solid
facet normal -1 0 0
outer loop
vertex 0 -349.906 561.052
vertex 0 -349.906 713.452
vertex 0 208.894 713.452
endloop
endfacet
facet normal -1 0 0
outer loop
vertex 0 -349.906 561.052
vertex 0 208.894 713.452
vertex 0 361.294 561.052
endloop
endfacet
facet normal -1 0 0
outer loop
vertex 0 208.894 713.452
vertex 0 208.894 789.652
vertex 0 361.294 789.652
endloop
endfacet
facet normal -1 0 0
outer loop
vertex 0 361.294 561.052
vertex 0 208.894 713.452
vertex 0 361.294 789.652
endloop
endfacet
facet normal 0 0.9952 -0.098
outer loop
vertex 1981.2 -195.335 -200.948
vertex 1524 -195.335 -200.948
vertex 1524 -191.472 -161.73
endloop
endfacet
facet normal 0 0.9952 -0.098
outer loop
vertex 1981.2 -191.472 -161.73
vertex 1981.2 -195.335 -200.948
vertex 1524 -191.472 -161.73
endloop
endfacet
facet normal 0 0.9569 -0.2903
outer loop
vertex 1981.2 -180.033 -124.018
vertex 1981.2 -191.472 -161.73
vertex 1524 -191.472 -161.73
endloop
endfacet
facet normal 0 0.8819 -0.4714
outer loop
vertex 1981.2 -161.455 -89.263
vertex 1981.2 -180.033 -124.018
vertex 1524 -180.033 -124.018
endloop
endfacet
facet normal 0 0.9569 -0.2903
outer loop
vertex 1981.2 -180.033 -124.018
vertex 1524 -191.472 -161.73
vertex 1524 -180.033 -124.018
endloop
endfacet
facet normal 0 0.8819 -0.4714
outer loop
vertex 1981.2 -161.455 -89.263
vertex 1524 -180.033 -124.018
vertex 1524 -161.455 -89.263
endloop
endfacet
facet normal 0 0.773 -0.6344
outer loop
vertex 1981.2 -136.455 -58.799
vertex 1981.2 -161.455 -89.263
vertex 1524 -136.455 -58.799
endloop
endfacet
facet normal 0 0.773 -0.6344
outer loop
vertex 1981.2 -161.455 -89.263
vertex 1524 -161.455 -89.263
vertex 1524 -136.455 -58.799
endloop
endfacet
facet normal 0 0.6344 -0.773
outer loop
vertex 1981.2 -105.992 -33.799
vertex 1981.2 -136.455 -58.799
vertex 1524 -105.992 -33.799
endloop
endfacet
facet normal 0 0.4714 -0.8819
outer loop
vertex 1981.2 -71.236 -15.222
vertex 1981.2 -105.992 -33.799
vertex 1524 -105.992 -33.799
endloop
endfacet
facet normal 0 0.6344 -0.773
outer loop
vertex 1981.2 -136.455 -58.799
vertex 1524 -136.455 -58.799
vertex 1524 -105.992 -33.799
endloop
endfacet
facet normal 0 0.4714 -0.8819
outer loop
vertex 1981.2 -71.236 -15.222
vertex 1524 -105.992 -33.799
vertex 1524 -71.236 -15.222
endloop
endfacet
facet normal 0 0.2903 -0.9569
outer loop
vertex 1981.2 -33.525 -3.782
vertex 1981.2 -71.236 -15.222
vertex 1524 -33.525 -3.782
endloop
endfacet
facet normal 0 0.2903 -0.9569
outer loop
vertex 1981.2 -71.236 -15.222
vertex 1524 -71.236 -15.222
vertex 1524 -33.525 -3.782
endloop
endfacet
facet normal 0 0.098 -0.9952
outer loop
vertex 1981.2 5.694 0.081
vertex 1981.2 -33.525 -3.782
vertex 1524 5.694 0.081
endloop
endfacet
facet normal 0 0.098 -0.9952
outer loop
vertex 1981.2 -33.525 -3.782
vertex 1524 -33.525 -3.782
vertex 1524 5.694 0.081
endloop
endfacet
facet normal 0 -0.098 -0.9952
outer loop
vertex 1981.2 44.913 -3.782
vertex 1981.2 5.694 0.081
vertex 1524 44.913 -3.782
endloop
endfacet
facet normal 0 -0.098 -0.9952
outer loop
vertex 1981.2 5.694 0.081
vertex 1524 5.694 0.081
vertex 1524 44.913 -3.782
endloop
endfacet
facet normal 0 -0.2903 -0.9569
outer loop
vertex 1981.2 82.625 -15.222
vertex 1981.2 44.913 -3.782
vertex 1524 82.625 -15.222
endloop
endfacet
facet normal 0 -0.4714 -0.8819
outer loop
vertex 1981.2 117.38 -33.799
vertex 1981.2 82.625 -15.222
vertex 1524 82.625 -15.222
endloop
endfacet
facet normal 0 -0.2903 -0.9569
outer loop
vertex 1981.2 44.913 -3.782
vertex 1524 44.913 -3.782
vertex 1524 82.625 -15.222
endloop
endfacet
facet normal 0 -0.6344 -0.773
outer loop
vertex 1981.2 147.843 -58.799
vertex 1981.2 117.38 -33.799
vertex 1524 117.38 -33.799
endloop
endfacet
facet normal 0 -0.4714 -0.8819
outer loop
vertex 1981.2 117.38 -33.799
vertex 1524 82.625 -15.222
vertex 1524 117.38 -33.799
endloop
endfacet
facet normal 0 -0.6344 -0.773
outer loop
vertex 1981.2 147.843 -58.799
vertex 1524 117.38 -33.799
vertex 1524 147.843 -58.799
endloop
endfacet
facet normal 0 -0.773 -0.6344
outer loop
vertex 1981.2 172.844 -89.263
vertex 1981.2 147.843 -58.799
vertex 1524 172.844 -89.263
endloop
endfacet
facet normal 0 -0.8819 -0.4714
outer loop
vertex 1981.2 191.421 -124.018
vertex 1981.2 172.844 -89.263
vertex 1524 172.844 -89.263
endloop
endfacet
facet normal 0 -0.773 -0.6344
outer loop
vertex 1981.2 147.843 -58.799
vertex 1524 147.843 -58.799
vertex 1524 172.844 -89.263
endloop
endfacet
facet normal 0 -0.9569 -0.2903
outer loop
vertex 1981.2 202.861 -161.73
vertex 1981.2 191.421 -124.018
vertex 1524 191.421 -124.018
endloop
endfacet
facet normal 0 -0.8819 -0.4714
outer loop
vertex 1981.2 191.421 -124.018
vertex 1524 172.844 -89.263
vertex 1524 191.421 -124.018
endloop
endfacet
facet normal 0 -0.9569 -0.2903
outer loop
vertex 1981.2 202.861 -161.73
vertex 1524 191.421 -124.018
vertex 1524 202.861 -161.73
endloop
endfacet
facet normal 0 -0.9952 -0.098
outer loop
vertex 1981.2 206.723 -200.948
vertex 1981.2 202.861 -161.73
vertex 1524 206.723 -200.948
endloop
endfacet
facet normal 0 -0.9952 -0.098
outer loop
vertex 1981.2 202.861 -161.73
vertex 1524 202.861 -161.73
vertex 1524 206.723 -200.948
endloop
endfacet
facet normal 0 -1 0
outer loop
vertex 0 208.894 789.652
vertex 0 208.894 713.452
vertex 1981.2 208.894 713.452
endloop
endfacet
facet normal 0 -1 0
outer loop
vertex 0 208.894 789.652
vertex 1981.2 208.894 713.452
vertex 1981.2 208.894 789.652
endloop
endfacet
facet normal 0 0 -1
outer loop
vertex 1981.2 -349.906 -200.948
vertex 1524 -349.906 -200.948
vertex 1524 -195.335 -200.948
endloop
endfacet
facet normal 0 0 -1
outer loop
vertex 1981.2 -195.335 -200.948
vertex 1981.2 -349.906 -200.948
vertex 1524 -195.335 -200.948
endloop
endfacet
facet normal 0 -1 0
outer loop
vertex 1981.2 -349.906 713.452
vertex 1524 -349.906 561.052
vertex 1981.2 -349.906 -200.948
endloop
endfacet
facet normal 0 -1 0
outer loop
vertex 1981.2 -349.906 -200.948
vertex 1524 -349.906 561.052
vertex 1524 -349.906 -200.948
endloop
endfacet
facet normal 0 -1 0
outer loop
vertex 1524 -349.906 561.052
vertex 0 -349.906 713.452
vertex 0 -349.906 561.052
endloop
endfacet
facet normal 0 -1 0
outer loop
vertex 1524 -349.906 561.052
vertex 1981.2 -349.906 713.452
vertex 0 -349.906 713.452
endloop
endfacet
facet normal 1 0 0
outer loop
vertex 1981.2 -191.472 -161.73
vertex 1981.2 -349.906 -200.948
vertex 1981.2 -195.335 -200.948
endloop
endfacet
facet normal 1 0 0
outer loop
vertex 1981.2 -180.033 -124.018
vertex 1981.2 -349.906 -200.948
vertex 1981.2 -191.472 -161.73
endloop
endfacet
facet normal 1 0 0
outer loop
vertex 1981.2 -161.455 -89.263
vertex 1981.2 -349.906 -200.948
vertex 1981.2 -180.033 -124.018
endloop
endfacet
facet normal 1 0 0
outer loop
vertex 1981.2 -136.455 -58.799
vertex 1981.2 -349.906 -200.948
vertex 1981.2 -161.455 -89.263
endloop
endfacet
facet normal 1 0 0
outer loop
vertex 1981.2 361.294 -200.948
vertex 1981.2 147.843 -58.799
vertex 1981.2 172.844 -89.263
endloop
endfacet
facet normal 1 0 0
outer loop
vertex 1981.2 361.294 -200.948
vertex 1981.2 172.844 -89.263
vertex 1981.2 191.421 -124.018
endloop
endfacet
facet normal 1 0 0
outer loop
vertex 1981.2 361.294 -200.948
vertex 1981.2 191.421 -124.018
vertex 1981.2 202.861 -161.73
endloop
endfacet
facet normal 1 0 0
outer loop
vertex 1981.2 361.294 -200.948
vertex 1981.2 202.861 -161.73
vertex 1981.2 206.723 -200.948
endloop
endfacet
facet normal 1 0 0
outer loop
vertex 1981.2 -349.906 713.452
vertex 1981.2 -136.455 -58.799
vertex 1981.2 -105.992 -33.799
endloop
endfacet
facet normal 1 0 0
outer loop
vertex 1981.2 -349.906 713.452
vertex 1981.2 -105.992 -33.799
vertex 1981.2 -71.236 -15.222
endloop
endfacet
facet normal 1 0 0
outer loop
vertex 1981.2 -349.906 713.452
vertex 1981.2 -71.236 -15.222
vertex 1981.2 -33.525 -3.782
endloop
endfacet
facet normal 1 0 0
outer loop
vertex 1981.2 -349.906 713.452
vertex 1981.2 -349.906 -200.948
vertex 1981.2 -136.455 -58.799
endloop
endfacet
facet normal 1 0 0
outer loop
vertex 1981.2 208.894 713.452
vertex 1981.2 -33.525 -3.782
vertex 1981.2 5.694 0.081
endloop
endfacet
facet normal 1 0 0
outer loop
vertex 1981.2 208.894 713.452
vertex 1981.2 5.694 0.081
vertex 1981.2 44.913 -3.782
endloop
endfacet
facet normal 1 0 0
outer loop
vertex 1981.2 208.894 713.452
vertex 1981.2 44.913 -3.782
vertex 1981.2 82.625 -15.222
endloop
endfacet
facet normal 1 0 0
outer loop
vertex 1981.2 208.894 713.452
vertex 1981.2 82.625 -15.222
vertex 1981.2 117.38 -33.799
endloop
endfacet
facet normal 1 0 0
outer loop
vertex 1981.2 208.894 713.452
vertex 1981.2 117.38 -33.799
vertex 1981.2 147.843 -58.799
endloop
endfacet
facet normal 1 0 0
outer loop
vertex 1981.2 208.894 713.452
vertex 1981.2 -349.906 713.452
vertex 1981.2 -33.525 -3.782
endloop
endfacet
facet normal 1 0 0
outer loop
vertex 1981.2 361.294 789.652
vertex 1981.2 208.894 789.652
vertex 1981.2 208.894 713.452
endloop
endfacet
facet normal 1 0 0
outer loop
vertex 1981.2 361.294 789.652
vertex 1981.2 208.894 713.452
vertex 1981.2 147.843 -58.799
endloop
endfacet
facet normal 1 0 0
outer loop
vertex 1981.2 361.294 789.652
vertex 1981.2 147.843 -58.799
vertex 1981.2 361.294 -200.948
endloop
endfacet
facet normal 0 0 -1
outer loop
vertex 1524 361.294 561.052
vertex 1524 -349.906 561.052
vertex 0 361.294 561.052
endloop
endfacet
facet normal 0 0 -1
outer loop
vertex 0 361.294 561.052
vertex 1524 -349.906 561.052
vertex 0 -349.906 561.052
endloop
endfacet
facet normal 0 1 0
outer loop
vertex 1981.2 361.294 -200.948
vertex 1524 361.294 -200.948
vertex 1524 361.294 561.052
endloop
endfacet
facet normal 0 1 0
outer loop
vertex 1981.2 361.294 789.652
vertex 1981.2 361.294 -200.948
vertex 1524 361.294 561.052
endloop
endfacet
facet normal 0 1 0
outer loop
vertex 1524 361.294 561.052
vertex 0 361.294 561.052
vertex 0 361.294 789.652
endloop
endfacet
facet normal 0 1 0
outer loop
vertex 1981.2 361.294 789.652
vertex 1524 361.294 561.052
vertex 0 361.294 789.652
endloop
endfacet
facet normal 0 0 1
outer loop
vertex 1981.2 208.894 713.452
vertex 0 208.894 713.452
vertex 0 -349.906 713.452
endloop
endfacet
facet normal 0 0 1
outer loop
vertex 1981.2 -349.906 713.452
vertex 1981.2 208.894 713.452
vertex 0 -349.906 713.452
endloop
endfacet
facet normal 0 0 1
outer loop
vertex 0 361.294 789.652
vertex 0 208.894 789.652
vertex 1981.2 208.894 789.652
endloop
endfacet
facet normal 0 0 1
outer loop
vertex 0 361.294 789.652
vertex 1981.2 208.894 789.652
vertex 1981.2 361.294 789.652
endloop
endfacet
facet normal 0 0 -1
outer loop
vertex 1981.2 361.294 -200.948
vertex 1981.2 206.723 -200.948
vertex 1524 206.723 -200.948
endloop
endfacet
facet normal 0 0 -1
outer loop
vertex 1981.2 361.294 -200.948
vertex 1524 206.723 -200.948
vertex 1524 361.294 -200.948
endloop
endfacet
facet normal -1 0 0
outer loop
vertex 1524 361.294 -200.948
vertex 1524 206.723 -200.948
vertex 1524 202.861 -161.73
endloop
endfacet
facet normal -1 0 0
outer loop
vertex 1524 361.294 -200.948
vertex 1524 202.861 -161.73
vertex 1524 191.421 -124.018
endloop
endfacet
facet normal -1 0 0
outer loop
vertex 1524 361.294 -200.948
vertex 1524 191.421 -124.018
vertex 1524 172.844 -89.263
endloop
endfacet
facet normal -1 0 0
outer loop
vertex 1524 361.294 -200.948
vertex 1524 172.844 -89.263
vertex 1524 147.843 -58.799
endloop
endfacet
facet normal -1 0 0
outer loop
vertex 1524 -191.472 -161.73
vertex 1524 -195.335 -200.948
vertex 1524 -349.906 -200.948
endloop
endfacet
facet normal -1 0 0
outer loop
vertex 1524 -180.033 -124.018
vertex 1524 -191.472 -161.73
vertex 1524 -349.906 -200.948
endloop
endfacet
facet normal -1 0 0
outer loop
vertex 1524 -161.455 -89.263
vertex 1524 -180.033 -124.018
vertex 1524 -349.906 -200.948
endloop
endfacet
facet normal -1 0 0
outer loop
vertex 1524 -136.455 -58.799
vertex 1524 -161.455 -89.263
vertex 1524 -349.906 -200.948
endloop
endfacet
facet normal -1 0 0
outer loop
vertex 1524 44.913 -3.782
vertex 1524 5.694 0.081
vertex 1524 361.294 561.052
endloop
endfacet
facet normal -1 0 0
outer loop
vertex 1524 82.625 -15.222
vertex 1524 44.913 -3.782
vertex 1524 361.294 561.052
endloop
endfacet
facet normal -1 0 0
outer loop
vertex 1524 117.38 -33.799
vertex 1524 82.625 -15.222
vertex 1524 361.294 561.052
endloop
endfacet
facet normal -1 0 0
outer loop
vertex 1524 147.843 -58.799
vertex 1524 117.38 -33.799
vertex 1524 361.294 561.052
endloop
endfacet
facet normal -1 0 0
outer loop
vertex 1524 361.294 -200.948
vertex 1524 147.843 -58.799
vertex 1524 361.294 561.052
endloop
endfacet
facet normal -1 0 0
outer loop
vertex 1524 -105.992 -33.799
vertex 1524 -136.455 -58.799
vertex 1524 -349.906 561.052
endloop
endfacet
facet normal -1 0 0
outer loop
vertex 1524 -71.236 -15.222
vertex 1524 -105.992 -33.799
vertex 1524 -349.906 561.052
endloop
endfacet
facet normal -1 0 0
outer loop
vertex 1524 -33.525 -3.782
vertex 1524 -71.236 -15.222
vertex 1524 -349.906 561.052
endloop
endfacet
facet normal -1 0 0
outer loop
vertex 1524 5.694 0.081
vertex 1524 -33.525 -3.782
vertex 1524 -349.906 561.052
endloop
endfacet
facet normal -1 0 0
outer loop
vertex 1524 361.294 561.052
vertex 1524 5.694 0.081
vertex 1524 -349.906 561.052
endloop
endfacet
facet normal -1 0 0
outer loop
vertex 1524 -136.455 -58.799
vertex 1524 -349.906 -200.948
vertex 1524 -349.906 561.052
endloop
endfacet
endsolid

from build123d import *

# Parameters (mm, degrees)
F0_W     = 152.4
F0_H     = 76.2
F1_DEPTH = 1981.2
F2_W     = 1524
F2_H     = 762
F2_W_2   = 59.057254
F3_DEPTH = 711.2


with BuildPart() as f1:
    # F0 (on Right) → F1 (new body)
    with BuildSketch(Plane.YZ):
        with BuildLine():
            Line((208.894142, 713.451522), (-349.905858, 713.451522))
            Line((-349.905858, 713.451522), (-349.905858, -200.948478))
            Line((-349.905858, -200.948478), (-195.334996, -200.948478))
            ThreePointArc((-195.334996, -200.948478), (5.694142, 0.080659), (206.723279, -200.948478))
            Line((206.723279, -200.948478), (361.294142, -200.948478))
            Line((361.294142, -200.948478), (361.294142, 713.451522))
            Line((361.294142, 713.451522), (208.894142, 713.451522))
        make_face()
        with Locations((285.094142, 751.551522)):
            Rectangle(F0_W, F0_H)
    extrude(amount=F1_DEPTH)

    # F2 (on face) → F3 (cut)
    with BuildSketch(Plane.XZ.offset(349.905858)):
        with Locations((762, 180.051522)):
            Rectangle(F2_W, F2_H)
        with Locations((-29.528627, 180.051522)):
            Rectangle(F2_W_2, F2_H)
    extrude(amount=-F3_DEPTH, mode=Mode.SUBTRACT)


solid = f1.part
